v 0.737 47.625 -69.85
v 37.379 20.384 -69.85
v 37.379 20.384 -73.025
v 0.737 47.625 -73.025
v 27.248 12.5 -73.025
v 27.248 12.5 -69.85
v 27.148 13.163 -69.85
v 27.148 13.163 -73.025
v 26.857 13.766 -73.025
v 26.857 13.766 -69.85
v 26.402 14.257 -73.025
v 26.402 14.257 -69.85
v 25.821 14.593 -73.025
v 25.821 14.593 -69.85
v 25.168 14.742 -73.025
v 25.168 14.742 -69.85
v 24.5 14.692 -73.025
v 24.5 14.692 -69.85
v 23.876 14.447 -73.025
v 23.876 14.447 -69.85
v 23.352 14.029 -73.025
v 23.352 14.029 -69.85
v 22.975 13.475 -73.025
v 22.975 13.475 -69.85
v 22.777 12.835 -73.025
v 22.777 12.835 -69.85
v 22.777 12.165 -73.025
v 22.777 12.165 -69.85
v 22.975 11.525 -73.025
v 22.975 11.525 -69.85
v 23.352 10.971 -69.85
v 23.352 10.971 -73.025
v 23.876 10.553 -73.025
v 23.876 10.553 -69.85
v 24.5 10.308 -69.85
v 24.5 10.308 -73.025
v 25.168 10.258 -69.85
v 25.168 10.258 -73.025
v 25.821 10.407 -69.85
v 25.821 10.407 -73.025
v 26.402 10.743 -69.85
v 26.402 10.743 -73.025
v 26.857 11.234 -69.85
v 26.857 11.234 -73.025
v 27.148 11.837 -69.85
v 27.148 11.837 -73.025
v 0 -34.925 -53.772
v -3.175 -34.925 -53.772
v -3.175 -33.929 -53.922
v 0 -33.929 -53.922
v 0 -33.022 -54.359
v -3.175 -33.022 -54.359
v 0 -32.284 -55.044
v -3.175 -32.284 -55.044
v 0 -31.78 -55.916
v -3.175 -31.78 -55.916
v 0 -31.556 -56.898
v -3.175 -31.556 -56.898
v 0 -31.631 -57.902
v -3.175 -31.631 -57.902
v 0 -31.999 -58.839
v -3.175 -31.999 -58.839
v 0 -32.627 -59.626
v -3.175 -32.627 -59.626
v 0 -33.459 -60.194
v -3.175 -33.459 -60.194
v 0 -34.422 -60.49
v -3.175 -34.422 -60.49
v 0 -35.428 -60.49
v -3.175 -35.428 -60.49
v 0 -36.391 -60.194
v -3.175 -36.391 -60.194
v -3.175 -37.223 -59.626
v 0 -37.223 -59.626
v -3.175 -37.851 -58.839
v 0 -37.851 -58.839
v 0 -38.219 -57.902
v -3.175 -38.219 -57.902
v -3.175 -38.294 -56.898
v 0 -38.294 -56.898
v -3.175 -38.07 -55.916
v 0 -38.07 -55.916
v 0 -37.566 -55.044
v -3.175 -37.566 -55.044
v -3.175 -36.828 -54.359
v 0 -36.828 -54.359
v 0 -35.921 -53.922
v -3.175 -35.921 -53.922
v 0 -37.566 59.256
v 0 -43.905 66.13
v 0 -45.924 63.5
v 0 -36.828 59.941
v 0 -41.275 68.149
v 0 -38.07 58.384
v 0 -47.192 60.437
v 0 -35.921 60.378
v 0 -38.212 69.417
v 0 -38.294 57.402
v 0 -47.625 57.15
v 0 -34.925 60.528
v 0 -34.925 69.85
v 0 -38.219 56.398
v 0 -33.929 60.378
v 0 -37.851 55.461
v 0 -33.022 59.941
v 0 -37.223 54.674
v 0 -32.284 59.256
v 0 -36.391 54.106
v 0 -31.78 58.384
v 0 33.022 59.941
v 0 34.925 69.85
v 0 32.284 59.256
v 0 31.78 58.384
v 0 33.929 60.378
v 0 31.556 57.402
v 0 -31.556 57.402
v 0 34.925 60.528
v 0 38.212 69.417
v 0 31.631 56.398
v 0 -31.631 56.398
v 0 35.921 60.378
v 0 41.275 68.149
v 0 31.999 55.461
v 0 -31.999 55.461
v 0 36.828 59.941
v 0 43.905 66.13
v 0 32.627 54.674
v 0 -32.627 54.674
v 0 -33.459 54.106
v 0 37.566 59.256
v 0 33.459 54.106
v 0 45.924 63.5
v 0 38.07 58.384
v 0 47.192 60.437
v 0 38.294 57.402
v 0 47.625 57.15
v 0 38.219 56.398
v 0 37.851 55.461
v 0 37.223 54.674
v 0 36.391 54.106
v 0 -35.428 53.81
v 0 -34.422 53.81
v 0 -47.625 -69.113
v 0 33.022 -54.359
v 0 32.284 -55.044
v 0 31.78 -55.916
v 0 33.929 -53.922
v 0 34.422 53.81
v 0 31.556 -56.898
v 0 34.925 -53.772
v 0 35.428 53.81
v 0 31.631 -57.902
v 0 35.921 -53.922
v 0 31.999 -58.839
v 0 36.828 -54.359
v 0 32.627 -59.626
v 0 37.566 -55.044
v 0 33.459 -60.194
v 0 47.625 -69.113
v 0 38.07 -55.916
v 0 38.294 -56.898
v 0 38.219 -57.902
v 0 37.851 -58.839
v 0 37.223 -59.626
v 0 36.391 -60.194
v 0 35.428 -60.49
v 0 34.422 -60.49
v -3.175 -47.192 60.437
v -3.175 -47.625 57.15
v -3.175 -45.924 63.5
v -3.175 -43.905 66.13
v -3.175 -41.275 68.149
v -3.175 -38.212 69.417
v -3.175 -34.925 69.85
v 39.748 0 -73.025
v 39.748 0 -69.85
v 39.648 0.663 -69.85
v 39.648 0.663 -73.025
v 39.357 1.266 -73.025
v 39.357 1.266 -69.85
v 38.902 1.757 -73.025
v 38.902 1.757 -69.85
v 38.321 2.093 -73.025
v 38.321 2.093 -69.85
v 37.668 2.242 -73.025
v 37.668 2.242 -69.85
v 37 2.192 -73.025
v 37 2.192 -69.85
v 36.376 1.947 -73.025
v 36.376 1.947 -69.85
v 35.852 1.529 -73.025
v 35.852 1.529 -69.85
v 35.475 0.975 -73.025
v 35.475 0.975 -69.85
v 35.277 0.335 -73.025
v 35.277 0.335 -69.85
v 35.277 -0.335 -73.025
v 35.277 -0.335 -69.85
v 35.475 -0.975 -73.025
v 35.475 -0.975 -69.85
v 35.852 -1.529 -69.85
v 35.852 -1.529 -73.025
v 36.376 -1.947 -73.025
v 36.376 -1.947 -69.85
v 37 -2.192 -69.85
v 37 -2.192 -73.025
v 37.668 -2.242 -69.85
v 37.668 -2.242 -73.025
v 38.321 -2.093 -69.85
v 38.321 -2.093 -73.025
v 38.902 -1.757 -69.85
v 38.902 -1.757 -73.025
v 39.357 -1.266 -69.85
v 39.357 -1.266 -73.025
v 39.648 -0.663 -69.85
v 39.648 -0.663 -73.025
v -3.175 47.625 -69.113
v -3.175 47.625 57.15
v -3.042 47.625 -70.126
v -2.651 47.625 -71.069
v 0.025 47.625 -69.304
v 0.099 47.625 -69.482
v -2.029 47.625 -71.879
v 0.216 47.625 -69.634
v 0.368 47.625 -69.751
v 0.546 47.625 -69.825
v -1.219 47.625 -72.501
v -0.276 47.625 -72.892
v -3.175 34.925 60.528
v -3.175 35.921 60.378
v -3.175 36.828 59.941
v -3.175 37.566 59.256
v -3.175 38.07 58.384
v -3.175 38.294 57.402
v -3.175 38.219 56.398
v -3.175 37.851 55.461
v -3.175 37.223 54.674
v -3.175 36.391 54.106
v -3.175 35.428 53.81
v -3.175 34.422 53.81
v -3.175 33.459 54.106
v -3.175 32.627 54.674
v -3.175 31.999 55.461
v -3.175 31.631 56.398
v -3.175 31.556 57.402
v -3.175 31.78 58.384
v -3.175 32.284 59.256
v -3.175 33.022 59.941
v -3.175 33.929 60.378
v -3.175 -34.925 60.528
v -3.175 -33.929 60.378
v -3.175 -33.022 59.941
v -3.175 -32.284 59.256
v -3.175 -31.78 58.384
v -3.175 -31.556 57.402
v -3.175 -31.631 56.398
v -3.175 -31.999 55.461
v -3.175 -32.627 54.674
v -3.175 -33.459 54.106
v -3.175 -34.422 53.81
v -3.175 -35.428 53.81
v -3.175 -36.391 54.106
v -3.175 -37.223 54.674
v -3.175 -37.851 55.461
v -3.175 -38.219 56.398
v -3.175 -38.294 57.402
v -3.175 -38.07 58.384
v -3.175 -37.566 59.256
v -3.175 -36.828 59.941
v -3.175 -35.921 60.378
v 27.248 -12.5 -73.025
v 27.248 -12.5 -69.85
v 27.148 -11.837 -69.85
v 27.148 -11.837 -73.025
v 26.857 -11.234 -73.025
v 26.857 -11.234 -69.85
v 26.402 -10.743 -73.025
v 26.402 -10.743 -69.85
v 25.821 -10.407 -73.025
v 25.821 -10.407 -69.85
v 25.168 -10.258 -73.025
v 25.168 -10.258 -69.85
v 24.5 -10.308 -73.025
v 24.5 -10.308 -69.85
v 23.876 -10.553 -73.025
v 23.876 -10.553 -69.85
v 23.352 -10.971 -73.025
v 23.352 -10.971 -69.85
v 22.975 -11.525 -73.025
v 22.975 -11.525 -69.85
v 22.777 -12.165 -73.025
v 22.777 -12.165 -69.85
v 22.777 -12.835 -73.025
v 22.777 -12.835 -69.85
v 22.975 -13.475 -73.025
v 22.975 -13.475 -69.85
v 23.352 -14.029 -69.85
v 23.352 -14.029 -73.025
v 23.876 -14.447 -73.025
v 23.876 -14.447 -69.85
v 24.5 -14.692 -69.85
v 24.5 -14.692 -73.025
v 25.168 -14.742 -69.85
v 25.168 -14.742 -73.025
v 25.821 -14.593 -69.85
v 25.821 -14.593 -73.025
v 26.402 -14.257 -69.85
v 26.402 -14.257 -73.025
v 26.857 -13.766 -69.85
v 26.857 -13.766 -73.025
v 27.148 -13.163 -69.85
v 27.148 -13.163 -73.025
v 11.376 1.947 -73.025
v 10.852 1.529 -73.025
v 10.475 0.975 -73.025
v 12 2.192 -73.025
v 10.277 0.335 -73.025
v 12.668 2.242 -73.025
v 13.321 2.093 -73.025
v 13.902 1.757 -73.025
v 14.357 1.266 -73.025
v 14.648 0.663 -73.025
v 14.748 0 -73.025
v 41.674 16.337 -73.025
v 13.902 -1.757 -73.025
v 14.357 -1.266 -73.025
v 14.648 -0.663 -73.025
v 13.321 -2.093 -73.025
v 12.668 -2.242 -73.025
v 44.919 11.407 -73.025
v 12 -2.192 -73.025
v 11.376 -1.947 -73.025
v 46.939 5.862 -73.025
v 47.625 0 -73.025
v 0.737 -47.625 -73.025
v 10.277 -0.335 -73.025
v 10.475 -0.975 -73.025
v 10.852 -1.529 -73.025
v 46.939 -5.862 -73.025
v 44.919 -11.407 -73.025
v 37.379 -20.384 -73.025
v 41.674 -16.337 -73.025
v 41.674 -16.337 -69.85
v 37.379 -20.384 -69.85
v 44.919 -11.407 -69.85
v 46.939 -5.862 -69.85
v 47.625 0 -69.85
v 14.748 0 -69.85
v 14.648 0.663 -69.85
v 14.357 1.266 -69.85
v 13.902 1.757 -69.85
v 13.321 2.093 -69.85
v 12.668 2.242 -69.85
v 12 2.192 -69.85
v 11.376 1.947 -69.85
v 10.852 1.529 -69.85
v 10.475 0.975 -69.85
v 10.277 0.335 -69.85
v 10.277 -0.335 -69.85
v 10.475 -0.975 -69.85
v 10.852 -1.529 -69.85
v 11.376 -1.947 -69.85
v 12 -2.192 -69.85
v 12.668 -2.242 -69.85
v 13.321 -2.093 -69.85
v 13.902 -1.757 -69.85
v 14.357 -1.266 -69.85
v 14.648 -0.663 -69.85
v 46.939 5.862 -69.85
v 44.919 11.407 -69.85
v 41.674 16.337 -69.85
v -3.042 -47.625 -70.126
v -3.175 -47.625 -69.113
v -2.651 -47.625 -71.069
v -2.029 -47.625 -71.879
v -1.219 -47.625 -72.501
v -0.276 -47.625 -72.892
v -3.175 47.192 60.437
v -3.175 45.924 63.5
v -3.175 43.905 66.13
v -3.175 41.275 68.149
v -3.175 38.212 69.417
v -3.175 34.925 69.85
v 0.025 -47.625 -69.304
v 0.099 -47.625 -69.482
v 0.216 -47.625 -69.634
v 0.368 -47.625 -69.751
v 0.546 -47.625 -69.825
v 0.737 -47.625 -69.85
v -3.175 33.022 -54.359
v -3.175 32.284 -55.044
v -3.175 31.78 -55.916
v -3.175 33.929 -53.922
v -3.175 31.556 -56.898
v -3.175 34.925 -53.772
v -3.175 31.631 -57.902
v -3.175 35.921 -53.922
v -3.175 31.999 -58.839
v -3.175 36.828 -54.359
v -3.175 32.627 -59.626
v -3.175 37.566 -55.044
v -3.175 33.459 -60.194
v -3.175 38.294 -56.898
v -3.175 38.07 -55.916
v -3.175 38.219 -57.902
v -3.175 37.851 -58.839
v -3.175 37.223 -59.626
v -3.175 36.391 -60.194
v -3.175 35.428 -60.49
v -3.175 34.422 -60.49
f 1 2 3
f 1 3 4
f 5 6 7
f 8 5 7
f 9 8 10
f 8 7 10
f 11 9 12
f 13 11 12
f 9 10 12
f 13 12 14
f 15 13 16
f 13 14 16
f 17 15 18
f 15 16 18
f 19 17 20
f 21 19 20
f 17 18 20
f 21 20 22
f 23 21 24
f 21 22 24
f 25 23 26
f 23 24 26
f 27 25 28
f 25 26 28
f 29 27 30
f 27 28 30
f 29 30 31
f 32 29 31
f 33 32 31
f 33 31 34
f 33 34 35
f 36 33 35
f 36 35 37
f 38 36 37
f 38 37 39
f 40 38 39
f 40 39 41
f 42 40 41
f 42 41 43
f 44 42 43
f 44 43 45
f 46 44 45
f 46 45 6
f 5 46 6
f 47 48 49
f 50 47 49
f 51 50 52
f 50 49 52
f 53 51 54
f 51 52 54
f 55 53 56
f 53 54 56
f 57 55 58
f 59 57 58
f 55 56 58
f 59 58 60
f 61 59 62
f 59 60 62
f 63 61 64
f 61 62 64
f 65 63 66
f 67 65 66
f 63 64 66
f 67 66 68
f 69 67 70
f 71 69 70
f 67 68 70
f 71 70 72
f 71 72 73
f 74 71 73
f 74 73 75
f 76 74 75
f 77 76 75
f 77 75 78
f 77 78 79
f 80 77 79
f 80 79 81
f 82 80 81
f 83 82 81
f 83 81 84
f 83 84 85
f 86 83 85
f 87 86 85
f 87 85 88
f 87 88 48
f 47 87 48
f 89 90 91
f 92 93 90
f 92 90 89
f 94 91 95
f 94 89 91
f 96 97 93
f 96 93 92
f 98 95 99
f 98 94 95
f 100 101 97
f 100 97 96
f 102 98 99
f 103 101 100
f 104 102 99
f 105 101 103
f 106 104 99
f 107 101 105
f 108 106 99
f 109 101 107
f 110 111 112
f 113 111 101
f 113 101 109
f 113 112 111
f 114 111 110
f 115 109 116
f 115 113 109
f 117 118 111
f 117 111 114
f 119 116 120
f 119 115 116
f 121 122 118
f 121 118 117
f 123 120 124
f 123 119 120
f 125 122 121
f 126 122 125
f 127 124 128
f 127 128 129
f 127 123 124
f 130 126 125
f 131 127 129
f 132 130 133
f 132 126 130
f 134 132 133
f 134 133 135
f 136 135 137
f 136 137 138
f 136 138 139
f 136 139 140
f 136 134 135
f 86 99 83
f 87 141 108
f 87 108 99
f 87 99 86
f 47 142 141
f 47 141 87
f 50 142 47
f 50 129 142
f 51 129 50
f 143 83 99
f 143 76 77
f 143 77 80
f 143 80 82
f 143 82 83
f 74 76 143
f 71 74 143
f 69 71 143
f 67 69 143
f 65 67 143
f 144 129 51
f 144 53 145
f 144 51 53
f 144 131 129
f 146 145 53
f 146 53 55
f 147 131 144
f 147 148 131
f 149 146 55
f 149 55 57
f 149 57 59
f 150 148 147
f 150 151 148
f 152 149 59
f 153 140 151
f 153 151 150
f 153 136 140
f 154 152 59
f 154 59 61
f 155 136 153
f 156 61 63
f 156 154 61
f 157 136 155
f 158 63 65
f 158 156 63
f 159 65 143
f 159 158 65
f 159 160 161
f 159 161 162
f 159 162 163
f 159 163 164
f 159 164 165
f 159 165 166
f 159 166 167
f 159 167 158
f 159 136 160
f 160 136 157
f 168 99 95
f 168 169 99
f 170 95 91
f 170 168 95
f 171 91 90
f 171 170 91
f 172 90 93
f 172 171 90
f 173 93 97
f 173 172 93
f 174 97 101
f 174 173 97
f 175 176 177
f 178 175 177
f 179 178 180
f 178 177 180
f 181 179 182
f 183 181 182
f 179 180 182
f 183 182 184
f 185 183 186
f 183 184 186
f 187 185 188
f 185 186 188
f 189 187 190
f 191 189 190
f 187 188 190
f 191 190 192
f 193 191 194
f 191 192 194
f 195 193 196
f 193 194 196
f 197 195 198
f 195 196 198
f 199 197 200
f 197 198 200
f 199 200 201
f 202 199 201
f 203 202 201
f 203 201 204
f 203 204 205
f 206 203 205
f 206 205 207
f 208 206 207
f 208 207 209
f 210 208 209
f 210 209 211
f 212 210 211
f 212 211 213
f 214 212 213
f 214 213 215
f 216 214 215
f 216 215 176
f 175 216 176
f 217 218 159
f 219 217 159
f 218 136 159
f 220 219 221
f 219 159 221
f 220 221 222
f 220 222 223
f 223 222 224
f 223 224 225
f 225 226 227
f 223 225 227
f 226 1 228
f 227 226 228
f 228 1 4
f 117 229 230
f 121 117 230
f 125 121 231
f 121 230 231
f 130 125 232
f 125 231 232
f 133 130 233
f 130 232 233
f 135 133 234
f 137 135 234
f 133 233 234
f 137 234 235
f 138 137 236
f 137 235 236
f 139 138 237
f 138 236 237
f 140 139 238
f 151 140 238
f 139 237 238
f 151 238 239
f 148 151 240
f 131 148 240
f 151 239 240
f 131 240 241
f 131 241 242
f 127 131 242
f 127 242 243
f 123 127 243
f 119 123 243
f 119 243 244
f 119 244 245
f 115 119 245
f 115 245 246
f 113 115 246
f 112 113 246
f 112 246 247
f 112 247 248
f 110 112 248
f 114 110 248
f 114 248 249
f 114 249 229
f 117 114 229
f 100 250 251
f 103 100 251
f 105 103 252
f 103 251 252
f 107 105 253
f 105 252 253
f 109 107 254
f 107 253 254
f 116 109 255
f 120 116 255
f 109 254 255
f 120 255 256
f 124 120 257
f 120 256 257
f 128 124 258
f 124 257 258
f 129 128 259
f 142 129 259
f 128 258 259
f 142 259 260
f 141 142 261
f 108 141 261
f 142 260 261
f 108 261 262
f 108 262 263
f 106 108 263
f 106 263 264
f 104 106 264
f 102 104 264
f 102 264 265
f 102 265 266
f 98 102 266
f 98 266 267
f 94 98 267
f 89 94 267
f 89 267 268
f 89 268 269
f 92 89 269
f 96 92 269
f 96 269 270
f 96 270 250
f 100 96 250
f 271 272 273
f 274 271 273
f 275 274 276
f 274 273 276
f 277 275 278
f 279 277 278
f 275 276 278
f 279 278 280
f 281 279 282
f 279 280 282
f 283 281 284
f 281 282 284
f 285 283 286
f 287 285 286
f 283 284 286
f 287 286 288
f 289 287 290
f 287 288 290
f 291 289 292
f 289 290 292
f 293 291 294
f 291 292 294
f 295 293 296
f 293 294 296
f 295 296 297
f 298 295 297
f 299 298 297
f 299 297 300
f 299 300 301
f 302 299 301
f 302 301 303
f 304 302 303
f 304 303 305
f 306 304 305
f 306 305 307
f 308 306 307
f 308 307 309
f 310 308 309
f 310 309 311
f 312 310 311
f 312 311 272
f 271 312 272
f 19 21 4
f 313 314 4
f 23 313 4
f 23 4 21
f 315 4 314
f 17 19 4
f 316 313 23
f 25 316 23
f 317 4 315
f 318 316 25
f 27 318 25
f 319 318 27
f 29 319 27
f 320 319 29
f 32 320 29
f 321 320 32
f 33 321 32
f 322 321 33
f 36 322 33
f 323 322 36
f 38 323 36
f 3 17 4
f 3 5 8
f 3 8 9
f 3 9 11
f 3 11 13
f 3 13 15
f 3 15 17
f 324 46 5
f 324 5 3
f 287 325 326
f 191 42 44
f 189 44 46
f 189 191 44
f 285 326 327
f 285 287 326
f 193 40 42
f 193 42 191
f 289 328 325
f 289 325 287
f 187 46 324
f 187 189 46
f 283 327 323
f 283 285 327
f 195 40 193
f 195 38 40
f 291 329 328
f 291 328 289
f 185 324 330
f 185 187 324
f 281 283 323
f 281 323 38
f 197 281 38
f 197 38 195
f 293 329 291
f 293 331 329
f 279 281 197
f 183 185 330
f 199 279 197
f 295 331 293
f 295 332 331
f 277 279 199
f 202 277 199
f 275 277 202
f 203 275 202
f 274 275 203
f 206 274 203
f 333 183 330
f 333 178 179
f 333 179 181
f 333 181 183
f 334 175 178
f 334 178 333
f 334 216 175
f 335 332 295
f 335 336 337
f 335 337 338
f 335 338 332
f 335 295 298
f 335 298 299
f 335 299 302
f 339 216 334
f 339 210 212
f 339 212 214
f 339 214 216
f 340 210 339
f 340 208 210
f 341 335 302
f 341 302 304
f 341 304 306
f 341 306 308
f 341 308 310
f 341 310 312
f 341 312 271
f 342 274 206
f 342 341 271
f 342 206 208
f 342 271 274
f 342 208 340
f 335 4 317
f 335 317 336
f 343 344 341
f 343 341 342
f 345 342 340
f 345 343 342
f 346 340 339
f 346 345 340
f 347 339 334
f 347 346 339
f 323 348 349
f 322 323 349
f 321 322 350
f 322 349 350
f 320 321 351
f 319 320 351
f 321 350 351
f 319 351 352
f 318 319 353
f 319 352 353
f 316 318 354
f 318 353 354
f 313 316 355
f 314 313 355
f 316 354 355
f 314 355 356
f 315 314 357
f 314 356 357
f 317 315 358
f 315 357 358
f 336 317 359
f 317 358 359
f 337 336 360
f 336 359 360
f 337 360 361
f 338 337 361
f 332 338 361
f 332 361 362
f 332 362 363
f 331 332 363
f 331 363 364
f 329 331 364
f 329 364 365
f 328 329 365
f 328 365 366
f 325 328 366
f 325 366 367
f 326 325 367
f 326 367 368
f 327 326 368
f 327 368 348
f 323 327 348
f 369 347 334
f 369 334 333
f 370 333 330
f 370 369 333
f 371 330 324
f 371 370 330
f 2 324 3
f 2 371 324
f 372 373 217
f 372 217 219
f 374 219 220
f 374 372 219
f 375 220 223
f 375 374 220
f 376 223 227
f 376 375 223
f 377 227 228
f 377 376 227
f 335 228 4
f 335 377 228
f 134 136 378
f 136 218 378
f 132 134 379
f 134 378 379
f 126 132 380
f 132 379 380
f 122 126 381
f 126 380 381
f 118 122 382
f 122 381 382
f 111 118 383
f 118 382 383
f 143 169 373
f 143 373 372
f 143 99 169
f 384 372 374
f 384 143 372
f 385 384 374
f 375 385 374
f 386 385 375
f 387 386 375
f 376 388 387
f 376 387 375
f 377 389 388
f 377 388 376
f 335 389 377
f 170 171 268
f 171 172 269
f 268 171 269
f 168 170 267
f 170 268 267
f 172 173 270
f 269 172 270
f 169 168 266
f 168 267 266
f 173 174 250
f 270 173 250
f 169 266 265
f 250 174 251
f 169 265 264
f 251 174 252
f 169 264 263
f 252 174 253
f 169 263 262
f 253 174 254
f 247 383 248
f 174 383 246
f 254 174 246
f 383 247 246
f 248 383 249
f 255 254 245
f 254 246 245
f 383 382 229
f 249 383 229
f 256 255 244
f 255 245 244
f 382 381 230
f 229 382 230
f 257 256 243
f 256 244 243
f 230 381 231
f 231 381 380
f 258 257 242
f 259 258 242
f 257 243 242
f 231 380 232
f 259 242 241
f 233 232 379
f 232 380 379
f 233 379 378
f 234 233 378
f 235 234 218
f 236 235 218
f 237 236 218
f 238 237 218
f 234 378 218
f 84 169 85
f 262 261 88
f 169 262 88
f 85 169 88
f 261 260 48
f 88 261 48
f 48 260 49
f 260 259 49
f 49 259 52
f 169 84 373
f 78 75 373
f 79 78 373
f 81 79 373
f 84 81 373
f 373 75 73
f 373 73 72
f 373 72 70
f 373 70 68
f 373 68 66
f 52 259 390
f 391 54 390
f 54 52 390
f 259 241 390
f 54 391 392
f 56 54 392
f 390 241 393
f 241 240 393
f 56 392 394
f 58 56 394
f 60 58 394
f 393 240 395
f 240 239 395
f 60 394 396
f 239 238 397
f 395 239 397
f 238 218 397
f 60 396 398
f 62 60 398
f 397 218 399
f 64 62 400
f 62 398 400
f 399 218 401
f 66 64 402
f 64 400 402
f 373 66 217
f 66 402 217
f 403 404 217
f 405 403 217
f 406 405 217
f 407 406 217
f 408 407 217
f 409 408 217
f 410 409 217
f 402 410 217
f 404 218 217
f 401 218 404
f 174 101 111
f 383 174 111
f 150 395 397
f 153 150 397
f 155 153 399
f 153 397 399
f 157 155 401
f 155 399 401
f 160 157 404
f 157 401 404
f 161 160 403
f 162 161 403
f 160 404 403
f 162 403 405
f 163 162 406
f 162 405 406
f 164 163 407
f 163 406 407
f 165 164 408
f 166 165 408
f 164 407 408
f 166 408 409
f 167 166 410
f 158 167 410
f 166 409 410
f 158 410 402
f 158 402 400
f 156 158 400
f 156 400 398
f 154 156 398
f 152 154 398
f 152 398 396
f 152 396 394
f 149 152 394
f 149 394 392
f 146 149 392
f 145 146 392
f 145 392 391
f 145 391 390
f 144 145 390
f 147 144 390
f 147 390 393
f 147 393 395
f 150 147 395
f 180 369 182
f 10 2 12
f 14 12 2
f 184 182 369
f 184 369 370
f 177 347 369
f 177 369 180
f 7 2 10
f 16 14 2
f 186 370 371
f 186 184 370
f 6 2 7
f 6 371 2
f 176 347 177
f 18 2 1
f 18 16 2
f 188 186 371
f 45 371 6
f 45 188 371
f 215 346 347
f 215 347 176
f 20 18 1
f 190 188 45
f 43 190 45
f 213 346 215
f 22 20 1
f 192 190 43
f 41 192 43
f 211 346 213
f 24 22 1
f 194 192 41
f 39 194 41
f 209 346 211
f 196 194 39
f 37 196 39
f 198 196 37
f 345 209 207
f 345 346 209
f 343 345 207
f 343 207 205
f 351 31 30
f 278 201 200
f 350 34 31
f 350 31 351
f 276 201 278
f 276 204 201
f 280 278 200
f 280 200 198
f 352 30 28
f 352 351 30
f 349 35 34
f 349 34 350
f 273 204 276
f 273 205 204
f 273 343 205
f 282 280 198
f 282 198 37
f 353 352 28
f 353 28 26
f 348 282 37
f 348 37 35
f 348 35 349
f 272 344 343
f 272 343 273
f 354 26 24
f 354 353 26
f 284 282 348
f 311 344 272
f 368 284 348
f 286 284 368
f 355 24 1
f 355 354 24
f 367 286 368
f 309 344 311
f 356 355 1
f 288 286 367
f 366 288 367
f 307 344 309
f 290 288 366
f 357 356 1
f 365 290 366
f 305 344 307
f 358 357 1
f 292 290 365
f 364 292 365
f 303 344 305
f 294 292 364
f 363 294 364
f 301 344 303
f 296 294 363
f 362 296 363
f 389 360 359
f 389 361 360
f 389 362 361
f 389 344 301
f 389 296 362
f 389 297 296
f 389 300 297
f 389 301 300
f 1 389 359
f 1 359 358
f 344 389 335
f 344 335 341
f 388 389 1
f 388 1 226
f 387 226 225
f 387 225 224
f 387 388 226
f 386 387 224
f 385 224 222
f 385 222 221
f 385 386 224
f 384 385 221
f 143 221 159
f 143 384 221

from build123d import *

# Parameters (mm, degrees)
SKETCH3_W                    = 139.7
SKETCH3_H                    = 95.25
BASE_FLANGE1_DEPTH           = 3.175
EDGE_FLANGE1_STRIP_W         = 14.1732
EDGE_FLANGE1_STRIP_H         = 3.175
EDGE_FLANGE1_STRIP_CUT_DEPTH = 95.25
EDGE_FLANGE1_DEPTH           = 95.25
CUT_EXTRUDE2_START           = -3.175
CUT_EXTRUDE2_DEPTH           = 3.175
F_8_CLEARANCE_HOLE1_D        = 4.4958
F_1_4_CLEARANCE_HOLE1_D      = 6.7564
FILLET1_R                    = 12.7


# Read off the part's stored shape, not the designer's step: Cut-Extrude2
# Sheet-metal steps are written as plain solids
with BuildPart() as part:
    # Sketch3 → Base-Flange1 (new body)
    with BuildSketch(Plane(origin=(0, 0, 0), x_dir=(0, 0, -1), z_dir=(1, 0, 0))):
        Rectangle(SKETCH3_W, SKETCH3_H)
    extrude(amount=-BASE_FLANGE1_DEPTH)

    # Edge-Flange1 strip (across the edge) → Edge-Flange1 strip cut (cut)
    with BuildSketch(Plane(origin=(0, -47.625, -69.85), x_dir=(0, 0, 1), z_dir=(0, 1, 0))):
        with Locations((-6.35, -1.5875)):
            Rectangle(EDGE_FLANGE1_STRIP_W, EDGE_FLANGE1_STRIP_H)
    extrude(amount=EDGE_FLANGE1_STRIP_CUT_DEPTH, mode=Mode.SUBTRACT)

    # Edge-Flange1 section (across the edge) → Edge-Flange1 (add)
    with BuildSketch(Plane(origin=(0, -47.625, -69.85), x_dir=(0, 0, 1), z_dir=(0, 1, 0))):
        with BuildLine():
            Line((-3.175, 0.7366), (-3.175, 47.625))
            Line((-3.175, 47.625), (0, 47.625))
            Line((0, 47.625), (0, 0.7366))
            ThreePointArc((0, 0.7366), (0.215745145, 0.215745145), (0.7366, 0))
            Line((0.7366, 0), (0.7366, -3.175))
            ThreePointArc((0.7366, -3.175), (-2.029318885, -2.029318885), (-3.175, 0.7366))
        make_face()
    extrude(amount=EDGE_FLANGE1_DEPTH)

    # Cut-Extrude2 outline → Cut-Extrude2 (cut)
    with BuildSketch(Plane(origin=(0, 0, -73.025), x_dir=(-1, 0, 0), z_dir=(0, 0, -1)).offset(CUT_EXTRUDE2_START)):
        with BuildLine():
            ThreePointArc((-37.379054473, -20.384176045), (-44.919415432, -11.407169158), (-47.625, 0))
            Line((-47.625, 0), (-47.625, -47.625))
            Line((-47.625, -47.625), (-0.7366, -47.625))
            Line((-0.7366, -47.625), (-37.379054473, -20.384176045))
        make_face()
        with BuildLine():
            ThreePointArc((-47.625, 0), (-44.919415432, 11.407169158), (-37.379054473, 20.384176045))
            Line((-37.379054473, 20.384176045), (-0.7366, 47.625))
            Line((-0.7366, 47.625), (-47.625, 47.625))
            Line((-47.625, 47.625), (-47.625, 0))
        make_face()
    extrude(amount=CUT_EXTRUDE2_DEPTH, mode=Mode.SUBTRACT)

    # #8 Clearance Hole1 (through all)
    with Locations(Plane(origin=(0, 0, -73.025), x_dir=(-1, 0, 0), z_dir=(0, 0, -1))):
        with Locations((-25, -12.5), (-37.5, 0), (-25, 12.5), (-12.5, 0)):
            Hole(F_8_CLEARANCE_HOLE1_D / 2)

    # 1/4 Clearance Hole1 (through all)
    with Locations(Plane(origin=(0, 0, 0), x_dir=(0, 0, -1), z_dir=(1, 0, 0))):
        with Locations((-57.15, 34.925), (57.15, 34.925), (57.15, -34.925), (-57.15, -34.925)):
            Hole(F_1_4_CLEARANCE_HOLE1_D / 2)

    # Fillet1
    fillet1_edges = [part.edges().sort_by_distance(p)[0] for p in [
        (-1.5875, -47.625, 69.85),
        (-1.5875, 47.625, 69.85),
    ]]
    fillet(fillet1_edges, radius=FILLET1_R)


solid = part.part
